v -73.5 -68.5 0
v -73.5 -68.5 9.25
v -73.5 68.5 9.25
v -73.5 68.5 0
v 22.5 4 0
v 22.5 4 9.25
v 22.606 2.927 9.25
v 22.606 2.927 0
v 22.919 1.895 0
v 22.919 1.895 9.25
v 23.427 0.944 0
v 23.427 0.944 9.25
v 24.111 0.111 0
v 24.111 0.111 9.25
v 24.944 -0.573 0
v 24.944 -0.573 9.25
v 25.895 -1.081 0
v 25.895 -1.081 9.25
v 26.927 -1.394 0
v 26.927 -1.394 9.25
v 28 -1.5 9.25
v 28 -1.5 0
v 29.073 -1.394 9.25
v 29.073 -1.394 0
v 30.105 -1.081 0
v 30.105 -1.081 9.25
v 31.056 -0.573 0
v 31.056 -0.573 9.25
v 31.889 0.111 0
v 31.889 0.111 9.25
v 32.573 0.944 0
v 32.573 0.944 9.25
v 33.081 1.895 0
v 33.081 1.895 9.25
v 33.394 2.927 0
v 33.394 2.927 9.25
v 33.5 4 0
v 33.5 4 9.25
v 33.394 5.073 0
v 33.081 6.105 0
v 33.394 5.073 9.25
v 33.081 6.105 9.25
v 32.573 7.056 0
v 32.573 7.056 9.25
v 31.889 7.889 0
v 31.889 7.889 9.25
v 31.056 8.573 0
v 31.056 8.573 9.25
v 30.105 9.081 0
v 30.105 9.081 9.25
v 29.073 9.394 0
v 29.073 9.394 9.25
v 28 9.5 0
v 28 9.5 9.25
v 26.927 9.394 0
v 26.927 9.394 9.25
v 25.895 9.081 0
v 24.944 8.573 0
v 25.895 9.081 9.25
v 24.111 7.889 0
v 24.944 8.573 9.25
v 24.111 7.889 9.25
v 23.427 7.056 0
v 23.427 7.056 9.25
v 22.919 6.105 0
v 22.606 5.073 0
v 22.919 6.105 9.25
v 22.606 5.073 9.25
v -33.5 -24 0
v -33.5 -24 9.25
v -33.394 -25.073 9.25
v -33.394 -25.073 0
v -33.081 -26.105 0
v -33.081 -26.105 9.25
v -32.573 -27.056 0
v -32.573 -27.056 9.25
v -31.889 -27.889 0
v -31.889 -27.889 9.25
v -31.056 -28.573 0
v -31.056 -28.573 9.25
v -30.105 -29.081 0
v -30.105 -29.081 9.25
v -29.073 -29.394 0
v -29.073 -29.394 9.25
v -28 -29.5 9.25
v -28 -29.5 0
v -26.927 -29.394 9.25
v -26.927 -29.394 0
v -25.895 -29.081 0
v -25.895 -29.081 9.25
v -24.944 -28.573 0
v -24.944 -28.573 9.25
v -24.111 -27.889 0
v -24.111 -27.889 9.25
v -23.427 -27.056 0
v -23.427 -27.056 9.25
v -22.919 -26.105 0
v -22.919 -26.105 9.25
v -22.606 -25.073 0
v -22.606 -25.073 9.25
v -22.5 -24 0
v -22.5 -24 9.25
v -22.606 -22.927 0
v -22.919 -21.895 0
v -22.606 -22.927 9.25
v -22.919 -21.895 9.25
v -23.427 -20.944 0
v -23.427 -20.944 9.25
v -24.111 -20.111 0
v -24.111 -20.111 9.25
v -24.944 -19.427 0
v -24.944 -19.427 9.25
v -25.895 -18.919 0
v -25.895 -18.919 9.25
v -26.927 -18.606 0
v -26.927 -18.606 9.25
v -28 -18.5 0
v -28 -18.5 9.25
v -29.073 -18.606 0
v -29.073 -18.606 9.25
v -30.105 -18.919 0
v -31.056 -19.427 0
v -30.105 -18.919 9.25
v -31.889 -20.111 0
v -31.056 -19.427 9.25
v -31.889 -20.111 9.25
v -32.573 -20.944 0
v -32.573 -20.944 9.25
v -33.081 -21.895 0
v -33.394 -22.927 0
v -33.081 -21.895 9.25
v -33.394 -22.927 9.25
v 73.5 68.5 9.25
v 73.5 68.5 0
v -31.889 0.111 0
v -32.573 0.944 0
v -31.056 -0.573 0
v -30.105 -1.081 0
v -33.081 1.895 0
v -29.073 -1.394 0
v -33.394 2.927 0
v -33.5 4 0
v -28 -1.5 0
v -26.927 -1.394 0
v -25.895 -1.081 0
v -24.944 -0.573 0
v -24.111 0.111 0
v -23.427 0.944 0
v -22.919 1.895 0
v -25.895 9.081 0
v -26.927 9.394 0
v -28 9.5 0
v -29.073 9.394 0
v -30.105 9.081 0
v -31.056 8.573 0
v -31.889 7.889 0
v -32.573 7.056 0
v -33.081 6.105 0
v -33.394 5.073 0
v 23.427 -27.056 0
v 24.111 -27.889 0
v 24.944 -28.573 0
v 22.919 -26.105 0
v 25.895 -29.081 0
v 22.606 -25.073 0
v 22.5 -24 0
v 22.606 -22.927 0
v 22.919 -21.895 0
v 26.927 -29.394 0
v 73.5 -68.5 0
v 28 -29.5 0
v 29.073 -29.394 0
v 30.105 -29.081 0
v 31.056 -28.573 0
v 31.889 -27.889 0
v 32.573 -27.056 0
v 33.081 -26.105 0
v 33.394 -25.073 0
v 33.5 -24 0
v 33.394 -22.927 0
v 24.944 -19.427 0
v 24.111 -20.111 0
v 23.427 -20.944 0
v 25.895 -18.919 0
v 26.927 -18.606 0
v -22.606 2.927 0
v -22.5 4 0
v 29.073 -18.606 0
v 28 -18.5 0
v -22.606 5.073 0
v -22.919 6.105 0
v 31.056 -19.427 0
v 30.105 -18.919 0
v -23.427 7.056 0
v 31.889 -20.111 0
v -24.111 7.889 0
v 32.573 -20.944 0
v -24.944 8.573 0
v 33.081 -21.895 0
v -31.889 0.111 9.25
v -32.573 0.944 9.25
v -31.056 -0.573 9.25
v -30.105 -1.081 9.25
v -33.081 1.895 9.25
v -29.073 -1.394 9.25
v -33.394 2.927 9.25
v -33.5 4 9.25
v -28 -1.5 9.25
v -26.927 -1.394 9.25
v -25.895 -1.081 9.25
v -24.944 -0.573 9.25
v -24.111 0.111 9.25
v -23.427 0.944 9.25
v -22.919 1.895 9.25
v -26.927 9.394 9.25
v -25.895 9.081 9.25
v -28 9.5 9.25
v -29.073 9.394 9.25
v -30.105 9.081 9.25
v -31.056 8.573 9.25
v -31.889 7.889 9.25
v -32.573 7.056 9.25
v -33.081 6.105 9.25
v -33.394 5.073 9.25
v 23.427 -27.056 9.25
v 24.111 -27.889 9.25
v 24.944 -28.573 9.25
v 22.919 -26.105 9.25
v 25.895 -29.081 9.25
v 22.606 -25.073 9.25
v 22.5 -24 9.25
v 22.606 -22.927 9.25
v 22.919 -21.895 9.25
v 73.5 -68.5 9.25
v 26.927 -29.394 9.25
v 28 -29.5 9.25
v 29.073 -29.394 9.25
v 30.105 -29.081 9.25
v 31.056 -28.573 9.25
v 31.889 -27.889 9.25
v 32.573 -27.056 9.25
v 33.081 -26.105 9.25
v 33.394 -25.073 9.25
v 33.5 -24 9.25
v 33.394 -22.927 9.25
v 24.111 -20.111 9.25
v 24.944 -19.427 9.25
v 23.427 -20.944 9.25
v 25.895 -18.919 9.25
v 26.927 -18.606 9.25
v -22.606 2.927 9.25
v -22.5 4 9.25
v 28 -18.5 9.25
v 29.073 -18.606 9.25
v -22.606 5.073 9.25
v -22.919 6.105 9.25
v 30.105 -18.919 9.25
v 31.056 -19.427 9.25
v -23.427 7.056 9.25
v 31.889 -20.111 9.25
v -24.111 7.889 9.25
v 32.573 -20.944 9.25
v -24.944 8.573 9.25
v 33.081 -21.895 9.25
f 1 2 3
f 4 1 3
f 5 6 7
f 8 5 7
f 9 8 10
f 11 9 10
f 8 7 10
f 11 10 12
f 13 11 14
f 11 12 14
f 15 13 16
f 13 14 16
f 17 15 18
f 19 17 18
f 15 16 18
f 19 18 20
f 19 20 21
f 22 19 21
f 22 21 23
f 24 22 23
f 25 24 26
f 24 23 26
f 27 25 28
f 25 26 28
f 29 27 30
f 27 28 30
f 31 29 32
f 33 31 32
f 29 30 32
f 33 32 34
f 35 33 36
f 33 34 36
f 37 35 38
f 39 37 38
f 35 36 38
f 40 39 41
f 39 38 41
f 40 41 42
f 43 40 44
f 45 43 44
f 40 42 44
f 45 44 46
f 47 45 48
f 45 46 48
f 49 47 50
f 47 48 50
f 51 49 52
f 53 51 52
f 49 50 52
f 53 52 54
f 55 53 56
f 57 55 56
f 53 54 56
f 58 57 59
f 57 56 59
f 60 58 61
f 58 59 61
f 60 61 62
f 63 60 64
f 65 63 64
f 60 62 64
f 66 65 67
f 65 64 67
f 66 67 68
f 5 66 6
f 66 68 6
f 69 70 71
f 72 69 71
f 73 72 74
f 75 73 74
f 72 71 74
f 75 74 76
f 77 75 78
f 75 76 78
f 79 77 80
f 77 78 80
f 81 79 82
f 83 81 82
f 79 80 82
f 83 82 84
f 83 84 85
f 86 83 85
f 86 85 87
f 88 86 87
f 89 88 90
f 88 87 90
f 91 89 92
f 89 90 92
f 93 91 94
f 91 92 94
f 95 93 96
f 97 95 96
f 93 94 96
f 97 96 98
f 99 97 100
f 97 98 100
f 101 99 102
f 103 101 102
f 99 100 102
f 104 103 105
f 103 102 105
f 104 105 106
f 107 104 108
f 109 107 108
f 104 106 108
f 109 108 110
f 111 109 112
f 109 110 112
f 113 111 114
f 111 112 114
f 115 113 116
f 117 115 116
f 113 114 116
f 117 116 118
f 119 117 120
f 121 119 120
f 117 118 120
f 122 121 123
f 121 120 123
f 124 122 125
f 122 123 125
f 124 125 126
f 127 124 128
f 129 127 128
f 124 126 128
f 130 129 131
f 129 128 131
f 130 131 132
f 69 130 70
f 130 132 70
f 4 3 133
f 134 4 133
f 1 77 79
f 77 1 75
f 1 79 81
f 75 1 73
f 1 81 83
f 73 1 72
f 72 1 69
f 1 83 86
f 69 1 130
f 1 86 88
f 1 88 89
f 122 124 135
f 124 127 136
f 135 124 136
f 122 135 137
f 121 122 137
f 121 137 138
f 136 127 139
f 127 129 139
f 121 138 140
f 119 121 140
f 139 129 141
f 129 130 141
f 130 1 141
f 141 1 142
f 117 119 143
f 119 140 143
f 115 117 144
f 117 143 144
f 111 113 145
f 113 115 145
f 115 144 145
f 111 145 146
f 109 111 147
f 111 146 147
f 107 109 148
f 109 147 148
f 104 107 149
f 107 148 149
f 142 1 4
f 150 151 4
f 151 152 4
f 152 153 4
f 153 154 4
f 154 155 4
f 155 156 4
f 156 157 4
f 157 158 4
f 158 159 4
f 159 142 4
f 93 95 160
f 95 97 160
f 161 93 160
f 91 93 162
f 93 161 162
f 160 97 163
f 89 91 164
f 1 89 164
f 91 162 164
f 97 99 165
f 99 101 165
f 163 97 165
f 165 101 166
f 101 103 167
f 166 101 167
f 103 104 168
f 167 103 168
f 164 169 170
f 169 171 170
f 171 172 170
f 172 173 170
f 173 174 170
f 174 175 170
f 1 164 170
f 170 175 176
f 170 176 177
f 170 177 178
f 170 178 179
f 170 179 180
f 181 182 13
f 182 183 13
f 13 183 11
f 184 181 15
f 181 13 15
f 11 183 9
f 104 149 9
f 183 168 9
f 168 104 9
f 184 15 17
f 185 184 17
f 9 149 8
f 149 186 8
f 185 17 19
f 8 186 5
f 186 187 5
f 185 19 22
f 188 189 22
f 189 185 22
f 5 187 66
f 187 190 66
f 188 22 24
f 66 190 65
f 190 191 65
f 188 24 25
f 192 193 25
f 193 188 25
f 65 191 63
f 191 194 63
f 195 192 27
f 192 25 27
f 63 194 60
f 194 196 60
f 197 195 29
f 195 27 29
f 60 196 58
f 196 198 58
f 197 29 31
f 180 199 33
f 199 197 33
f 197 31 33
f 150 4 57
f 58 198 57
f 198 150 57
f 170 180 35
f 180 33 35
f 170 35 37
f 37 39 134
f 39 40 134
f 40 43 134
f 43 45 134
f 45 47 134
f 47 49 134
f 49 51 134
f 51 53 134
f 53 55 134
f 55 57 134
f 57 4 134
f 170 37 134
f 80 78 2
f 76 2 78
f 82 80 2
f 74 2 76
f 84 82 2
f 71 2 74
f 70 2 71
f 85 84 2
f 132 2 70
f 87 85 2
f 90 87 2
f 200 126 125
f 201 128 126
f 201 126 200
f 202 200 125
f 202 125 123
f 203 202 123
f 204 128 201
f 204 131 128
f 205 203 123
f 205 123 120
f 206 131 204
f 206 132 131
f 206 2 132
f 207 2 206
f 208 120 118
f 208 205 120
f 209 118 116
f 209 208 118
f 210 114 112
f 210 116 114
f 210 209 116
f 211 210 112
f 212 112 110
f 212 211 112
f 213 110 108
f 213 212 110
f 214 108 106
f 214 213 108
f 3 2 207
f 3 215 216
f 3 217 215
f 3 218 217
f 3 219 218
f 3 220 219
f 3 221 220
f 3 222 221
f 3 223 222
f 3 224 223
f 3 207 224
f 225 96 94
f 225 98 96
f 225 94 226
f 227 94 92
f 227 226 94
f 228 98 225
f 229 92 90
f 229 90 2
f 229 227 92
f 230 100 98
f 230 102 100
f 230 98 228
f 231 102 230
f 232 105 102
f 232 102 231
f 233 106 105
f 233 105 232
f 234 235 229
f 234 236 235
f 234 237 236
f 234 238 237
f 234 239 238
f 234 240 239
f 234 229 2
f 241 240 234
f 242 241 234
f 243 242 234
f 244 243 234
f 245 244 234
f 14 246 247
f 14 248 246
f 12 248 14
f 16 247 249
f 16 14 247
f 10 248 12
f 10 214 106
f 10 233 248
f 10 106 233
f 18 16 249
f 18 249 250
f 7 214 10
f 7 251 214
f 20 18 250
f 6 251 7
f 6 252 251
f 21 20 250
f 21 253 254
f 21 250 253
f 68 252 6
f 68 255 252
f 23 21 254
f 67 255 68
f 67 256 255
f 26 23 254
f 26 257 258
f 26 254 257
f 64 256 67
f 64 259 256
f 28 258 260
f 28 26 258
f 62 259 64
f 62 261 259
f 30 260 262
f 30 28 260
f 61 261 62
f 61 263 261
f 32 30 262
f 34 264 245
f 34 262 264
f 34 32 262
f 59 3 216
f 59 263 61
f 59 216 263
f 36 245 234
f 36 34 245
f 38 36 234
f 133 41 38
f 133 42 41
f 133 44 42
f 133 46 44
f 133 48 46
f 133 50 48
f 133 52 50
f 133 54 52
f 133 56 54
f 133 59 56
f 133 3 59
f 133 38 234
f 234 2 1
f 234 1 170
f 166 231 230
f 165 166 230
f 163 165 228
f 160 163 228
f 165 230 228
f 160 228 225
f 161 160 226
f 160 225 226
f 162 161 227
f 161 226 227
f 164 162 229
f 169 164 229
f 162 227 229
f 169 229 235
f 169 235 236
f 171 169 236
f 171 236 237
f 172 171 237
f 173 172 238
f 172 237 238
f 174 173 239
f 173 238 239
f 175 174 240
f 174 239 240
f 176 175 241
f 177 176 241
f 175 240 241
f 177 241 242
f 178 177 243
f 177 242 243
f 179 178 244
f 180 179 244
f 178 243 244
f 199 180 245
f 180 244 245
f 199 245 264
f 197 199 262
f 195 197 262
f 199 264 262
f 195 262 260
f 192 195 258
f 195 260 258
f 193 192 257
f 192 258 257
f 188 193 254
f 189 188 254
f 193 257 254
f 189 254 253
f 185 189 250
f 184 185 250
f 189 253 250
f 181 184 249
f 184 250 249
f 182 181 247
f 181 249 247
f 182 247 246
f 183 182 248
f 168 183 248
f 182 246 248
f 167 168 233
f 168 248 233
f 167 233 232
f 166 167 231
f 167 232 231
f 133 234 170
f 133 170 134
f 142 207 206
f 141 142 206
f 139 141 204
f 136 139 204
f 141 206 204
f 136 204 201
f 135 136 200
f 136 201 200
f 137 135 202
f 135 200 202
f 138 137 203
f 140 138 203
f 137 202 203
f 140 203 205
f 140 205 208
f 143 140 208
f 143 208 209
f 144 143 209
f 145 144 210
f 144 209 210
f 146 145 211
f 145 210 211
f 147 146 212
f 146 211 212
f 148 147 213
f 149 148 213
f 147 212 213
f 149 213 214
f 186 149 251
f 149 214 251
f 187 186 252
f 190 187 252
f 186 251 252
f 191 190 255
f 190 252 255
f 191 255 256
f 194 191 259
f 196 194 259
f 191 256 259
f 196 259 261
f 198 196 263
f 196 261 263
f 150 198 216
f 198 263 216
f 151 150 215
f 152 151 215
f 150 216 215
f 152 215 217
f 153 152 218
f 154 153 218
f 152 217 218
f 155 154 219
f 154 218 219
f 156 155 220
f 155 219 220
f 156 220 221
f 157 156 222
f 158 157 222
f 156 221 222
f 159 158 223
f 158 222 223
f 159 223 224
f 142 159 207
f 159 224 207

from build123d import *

# Parameters (mm, degrees)
SKETCH1_W           = 147
SKETCH1_H           = 137
SKETCH1_R           = 5.5
BOSS_EXTRUDE1_DEPTH = 9.25


with BuildPart() as part:
    # Sketch1 → Boss-Extrude1 (new body)
    with BuildSketch(Plane.XY.offset(9.25)):
        Rectangle(SKETCH1_W, SKETCH1_H)
        with Locations(Location((-28, -24, 0), (0, 0, 180))):
            Circle(SKETCH1_R, mode=Mode.SUBTRACT)
        with Locations(Location((28, -24, 0), (0, 0, 180))):
            Circle(SKETCH1_R, mode=Mode.SUBTRACT)
        with Locations(Location((28, 4, 0), (0, 0, 180))):
            Circle(SKETCH1_R, mode=Mode.SUBTRACT)
        with Locations(Location((-28, 4, 0), (0, 0, 180))):
            Circle(SKETCH1_R, mode=Mode.SUBTRACT)
    extrude(amount=-BOSS_EXTRUDE1_DEPTH)


solid = part.part
